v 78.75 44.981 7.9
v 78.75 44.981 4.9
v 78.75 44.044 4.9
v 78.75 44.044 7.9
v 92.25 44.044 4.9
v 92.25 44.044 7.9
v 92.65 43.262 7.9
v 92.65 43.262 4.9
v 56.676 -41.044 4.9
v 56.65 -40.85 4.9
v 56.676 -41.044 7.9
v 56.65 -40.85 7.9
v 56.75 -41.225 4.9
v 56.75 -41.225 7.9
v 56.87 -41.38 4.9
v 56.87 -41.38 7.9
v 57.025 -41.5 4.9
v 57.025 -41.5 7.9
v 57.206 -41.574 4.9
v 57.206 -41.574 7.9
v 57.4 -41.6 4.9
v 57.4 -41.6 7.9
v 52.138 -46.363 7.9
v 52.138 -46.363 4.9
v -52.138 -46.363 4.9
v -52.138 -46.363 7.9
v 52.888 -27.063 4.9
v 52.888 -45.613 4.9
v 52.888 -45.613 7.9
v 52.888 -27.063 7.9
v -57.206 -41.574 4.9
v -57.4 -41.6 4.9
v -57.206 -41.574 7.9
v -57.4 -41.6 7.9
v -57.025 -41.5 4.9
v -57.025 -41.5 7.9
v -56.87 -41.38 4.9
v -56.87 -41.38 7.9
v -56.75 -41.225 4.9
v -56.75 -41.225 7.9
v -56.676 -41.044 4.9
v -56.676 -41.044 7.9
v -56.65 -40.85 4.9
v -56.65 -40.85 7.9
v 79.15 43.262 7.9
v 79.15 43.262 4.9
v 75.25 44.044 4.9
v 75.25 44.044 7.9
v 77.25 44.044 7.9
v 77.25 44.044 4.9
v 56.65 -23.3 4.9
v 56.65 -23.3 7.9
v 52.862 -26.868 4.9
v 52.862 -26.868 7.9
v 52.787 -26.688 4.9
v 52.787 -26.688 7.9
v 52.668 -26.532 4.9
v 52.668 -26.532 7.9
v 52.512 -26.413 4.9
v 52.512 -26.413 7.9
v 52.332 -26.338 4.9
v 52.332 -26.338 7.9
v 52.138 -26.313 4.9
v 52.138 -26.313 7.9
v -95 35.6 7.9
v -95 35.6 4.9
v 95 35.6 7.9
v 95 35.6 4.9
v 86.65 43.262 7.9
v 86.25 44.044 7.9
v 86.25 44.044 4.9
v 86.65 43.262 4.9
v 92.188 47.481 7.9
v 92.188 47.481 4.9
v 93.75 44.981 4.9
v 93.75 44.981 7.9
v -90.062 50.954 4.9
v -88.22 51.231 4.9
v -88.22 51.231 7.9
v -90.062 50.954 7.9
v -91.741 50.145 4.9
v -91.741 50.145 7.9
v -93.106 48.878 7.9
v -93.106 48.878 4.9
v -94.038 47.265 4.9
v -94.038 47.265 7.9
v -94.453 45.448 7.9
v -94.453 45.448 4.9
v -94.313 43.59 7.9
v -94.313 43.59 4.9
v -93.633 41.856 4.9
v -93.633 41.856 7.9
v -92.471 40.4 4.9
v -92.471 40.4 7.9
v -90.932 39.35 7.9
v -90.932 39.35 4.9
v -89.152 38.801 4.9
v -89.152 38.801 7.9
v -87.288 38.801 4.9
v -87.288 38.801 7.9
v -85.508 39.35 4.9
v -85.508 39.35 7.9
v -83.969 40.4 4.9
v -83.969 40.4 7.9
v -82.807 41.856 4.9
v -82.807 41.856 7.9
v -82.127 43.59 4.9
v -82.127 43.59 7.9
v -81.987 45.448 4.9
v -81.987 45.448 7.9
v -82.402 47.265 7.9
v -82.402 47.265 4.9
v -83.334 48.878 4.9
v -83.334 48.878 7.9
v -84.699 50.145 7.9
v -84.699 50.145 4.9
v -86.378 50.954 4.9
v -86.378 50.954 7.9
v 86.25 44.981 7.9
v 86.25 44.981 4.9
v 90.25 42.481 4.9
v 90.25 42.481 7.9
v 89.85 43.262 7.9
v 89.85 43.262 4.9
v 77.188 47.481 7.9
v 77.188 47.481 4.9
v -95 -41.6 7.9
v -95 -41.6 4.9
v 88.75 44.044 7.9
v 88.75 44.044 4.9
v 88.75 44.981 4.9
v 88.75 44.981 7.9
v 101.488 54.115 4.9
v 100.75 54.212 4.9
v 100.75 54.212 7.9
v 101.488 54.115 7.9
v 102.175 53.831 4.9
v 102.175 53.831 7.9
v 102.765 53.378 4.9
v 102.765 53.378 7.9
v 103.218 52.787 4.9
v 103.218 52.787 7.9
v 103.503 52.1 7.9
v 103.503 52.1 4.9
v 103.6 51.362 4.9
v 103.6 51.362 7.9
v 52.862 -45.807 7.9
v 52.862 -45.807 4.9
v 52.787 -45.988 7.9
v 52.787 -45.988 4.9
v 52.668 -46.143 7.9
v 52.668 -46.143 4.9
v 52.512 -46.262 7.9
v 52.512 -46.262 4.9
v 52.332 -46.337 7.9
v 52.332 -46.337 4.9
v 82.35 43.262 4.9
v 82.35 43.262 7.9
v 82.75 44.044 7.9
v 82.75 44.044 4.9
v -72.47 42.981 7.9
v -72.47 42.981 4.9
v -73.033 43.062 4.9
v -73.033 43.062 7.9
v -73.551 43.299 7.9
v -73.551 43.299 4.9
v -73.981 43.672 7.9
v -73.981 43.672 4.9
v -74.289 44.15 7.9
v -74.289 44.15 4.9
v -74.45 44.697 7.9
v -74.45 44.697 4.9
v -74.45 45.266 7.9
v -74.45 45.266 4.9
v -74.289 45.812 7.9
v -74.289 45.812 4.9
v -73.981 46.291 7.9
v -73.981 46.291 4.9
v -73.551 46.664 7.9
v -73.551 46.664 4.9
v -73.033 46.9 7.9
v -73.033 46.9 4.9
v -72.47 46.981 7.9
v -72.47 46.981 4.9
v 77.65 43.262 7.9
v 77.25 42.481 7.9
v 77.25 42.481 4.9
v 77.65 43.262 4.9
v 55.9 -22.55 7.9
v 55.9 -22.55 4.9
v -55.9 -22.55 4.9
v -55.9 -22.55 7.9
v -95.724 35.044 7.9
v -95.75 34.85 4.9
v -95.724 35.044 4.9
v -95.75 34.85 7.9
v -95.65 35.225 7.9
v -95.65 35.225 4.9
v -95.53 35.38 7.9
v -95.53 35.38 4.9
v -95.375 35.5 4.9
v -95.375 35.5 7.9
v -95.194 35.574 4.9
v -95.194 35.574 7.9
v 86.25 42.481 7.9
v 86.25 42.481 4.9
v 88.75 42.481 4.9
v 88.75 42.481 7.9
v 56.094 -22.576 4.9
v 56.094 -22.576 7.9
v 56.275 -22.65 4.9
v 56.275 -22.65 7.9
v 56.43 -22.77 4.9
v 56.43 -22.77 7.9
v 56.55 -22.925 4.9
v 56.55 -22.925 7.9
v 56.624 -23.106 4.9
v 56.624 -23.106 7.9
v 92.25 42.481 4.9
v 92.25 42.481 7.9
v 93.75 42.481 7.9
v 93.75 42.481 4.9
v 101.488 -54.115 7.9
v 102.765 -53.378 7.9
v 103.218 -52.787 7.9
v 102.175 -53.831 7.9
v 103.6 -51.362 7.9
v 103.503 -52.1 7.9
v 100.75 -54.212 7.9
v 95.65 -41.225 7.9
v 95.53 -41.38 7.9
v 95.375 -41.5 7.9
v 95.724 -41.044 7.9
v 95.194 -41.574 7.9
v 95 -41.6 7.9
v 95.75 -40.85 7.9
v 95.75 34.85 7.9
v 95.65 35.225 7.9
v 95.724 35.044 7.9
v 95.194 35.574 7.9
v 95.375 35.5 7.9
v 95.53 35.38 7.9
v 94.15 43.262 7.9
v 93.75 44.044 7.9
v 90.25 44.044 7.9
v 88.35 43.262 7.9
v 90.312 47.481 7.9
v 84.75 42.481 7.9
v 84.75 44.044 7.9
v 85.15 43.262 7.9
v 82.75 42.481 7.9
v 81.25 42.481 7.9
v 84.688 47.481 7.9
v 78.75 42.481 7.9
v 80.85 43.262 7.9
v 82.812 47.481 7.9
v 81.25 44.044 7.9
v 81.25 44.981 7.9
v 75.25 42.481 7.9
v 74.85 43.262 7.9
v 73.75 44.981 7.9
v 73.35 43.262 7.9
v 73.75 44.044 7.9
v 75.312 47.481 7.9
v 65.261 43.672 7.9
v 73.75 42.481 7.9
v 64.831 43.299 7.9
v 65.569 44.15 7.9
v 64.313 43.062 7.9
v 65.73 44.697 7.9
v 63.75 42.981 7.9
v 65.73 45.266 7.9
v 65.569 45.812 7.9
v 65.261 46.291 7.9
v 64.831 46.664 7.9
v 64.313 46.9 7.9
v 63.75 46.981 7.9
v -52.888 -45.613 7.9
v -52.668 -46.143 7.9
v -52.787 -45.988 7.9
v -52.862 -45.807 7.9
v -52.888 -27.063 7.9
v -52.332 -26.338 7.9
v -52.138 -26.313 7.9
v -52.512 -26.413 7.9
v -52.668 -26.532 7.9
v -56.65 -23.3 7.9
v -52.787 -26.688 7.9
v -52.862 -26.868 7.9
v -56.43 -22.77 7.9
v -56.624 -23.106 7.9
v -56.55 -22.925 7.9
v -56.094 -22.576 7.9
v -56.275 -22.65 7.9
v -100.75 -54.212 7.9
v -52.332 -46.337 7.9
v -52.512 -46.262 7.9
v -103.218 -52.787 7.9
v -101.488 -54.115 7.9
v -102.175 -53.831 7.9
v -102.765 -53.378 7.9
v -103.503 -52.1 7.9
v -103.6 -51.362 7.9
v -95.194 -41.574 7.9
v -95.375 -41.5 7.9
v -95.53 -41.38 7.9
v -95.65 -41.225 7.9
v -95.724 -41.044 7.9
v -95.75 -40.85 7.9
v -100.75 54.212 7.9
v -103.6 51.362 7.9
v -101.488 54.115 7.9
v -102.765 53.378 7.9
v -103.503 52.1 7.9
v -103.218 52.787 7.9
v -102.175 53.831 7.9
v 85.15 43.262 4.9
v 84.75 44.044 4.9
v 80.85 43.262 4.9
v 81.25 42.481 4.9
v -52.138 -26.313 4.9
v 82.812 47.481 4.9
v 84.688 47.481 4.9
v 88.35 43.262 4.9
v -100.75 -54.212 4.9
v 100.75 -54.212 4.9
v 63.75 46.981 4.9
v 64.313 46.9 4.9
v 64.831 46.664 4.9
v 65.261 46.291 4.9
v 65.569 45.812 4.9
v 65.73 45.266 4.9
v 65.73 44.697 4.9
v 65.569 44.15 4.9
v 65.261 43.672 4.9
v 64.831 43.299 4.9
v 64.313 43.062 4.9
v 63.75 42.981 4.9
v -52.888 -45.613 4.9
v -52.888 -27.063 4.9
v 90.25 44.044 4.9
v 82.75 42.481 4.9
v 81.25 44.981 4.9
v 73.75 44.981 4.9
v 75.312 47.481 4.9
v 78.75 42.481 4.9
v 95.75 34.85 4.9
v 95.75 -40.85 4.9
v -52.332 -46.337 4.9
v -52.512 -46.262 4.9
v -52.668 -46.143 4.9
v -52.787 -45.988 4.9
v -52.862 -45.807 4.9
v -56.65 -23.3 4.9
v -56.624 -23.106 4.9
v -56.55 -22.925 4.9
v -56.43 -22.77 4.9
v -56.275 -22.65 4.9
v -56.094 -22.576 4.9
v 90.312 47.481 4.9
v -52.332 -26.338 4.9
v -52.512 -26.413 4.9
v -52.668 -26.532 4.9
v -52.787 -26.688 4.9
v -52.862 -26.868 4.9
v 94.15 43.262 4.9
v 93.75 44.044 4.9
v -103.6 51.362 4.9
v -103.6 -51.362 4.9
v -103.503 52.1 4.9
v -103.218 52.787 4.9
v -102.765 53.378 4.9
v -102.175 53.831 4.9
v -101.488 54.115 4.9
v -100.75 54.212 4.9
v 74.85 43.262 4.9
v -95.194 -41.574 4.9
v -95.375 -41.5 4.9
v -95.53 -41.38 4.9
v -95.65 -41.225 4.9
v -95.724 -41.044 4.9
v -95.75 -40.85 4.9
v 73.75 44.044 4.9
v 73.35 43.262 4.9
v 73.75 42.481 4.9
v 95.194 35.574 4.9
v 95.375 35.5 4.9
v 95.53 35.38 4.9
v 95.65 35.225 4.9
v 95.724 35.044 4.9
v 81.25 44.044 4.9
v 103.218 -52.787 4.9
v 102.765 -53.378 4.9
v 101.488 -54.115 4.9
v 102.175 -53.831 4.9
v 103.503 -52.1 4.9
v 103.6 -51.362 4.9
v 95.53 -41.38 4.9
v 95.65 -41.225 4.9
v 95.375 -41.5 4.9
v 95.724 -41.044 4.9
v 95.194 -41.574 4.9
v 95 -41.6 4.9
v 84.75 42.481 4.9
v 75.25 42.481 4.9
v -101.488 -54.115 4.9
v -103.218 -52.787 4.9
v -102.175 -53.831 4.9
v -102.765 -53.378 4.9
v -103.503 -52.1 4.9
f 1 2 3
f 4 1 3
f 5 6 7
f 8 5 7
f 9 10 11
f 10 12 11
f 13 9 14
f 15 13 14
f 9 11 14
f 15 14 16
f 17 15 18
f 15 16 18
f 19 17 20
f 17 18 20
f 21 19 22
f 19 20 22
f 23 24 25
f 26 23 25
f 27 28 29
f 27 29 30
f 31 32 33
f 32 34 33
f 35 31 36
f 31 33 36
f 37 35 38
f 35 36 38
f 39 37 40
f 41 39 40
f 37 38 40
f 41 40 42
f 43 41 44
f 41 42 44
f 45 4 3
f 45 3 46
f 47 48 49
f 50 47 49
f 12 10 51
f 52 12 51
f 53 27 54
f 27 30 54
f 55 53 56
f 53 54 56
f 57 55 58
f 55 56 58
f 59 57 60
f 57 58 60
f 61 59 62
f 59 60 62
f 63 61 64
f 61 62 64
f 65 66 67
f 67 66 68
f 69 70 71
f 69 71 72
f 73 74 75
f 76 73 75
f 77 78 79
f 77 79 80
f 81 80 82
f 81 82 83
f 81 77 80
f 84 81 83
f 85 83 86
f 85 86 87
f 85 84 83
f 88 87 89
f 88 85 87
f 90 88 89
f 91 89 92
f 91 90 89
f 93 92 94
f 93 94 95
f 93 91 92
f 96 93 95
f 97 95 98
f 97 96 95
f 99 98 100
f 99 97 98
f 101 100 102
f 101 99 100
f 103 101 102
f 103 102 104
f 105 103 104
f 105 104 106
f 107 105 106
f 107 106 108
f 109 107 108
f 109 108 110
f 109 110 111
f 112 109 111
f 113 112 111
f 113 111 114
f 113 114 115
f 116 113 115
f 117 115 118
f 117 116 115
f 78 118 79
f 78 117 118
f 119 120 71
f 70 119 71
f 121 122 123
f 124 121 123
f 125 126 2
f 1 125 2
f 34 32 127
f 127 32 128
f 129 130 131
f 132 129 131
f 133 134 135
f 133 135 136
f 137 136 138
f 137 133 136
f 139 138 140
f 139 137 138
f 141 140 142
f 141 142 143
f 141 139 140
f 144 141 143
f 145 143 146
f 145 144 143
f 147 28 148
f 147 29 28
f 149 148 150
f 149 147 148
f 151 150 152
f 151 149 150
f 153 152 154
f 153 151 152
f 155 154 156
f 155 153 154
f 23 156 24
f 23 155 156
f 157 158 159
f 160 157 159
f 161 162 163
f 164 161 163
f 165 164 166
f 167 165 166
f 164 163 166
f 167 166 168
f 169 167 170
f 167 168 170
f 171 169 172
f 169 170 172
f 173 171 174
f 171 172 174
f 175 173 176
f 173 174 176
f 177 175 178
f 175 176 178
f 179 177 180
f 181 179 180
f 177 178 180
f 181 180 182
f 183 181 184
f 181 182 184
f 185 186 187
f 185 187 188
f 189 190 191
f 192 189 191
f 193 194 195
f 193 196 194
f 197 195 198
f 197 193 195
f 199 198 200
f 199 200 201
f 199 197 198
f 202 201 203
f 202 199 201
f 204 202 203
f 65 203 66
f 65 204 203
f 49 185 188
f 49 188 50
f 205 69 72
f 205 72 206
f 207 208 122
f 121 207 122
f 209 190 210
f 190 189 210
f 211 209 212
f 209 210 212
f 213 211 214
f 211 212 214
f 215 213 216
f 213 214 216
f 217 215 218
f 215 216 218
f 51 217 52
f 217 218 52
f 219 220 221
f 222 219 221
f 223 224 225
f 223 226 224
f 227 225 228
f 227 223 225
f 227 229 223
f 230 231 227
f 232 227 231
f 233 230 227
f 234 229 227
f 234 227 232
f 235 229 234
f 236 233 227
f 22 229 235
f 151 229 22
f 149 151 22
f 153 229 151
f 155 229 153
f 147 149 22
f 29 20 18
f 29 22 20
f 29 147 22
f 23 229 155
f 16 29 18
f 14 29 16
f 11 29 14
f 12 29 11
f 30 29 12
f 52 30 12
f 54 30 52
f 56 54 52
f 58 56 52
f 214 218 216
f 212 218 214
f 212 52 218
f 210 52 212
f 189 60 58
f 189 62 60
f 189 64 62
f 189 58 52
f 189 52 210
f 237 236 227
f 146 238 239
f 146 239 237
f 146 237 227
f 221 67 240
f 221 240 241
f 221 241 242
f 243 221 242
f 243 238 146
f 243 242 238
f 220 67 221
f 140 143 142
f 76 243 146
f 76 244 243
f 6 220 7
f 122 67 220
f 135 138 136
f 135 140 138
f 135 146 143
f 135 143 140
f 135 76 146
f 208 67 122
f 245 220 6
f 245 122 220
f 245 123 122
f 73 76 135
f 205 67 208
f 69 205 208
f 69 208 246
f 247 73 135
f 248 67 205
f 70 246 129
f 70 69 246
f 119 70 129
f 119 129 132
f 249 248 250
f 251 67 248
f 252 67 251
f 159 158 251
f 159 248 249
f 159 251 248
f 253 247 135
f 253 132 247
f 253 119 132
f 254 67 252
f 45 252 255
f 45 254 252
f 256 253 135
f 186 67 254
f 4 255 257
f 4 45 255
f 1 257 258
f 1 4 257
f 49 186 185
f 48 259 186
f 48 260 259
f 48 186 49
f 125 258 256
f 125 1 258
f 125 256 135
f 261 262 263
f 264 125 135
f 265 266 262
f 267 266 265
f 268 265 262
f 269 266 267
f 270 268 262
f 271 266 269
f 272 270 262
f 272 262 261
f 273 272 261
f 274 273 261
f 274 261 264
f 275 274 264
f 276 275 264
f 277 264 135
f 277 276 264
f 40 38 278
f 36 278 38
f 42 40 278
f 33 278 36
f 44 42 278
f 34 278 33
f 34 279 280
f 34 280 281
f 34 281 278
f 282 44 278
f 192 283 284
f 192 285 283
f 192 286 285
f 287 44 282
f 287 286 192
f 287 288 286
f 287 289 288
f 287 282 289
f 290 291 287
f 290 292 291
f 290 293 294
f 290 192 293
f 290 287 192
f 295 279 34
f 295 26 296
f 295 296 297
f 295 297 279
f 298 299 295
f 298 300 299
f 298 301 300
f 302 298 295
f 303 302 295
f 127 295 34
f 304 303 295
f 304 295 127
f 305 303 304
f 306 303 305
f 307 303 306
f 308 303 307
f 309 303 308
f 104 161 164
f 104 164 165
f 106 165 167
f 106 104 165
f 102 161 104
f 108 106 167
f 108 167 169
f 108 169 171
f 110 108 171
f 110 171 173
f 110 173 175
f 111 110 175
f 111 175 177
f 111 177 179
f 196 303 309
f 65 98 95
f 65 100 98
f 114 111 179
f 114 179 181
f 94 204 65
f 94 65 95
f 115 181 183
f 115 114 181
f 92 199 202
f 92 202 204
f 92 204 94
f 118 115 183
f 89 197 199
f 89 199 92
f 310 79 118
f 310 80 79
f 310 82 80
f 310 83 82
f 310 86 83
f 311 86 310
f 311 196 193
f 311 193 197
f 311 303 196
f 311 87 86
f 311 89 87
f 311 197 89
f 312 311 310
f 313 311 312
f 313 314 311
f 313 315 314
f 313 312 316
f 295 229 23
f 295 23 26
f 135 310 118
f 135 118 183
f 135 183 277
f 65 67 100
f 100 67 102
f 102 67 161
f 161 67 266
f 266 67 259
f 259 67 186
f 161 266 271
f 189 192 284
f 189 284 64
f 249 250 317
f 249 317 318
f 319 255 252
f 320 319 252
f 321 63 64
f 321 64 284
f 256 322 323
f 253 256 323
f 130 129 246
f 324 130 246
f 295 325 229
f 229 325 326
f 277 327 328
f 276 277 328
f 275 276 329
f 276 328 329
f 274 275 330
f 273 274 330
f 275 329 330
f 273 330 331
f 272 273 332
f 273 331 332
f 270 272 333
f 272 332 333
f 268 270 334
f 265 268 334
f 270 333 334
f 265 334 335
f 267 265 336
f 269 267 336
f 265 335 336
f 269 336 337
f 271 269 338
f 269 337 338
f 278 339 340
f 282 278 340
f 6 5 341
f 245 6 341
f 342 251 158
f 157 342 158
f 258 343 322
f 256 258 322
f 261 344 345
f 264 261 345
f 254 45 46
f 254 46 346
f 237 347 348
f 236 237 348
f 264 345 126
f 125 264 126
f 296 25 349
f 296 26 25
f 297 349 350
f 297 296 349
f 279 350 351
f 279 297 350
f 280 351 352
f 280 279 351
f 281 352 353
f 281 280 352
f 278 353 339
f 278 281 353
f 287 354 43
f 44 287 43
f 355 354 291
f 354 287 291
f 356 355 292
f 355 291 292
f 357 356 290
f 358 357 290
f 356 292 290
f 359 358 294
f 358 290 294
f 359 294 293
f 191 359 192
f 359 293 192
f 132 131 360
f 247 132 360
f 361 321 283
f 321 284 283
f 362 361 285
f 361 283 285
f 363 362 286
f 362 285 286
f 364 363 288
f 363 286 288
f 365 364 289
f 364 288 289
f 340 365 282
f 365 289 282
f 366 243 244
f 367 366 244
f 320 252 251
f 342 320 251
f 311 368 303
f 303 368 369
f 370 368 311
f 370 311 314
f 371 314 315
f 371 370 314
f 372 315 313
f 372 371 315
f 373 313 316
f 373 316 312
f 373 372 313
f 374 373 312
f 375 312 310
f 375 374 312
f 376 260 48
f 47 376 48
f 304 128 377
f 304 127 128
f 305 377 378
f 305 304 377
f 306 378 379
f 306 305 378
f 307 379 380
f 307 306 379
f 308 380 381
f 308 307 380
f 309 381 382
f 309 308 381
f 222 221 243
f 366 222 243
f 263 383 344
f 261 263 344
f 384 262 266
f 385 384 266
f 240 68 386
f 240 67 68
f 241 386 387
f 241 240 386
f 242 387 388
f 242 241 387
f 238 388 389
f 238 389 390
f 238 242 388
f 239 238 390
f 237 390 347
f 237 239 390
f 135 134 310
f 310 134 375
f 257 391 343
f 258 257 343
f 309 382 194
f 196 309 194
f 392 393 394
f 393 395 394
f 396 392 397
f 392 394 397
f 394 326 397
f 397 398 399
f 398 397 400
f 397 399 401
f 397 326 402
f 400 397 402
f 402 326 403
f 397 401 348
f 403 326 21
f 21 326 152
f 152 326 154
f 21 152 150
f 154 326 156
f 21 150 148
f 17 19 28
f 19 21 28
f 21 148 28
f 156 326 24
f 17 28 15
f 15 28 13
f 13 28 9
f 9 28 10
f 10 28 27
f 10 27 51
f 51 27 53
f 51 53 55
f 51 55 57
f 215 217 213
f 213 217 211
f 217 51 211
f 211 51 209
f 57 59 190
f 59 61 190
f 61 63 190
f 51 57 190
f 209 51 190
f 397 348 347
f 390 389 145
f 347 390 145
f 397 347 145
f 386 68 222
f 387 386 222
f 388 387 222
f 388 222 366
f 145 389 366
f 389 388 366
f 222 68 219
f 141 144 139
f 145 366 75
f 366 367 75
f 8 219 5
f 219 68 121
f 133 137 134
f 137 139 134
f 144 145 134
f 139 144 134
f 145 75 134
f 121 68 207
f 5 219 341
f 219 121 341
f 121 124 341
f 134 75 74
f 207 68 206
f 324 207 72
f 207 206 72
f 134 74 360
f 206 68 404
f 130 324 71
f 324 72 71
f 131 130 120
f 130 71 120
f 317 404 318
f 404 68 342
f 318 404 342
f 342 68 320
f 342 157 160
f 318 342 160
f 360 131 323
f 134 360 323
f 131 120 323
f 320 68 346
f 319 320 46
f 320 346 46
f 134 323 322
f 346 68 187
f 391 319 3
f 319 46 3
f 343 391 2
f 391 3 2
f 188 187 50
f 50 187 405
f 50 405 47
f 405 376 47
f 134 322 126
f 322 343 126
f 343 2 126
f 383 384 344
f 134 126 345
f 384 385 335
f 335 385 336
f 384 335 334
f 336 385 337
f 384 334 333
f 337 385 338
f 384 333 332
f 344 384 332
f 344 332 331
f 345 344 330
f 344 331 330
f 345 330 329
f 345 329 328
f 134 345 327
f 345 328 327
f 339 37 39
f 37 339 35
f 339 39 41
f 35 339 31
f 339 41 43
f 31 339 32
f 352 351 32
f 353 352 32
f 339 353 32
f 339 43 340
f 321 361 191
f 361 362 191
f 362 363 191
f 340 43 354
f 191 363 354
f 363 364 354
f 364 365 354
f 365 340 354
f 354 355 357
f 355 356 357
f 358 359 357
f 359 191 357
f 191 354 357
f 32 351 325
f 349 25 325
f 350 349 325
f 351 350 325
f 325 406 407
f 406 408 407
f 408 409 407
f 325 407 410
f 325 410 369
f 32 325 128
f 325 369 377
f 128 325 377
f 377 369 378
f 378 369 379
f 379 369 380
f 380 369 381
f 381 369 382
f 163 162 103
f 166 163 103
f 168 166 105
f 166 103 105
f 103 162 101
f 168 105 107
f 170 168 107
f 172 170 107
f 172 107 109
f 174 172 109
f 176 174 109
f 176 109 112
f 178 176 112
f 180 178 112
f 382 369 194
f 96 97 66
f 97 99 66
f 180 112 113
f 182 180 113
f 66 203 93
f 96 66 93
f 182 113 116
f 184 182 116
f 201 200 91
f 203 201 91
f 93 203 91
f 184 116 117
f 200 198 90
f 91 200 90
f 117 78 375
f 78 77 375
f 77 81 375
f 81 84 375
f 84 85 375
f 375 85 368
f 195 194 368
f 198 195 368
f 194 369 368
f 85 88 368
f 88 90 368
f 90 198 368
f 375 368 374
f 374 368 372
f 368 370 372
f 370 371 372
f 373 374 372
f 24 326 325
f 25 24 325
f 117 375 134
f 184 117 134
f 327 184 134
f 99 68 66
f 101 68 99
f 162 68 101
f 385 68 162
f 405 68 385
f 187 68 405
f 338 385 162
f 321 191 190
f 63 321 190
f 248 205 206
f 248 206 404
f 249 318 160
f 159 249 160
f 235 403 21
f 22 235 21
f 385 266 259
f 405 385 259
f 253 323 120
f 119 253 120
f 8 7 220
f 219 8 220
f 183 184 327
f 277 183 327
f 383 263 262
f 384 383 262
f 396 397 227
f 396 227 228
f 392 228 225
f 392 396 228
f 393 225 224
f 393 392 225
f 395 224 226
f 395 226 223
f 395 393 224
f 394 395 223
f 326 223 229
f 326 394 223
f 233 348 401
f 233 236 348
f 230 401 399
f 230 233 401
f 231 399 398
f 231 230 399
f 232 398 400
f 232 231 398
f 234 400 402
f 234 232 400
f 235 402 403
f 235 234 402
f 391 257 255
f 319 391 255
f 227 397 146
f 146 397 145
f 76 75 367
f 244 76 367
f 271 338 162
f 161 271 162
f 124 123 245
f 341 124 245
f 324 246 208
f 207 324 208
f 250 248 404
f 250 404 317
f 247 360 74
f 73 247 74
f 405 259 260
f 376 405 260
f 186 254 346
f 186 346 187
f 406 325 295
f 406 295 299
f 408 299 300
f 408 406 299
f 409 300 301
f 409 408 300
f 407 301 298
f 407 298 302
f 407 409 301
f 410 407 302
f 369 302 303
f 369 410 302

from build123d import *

# Parameters (mm, degrees)
SHAPEBINDER_W   = 20.05
SHAPEBINDER_H   = 105.775
SHAPEBINDER_R   = 6.25
PAD001_DEPTH    = 3
POCKET006_DEPTH = 3
FILLET001_R     = 0.75
SKETCH035_W     = 20
SKETCH035_H     = 1.5625
PAD015_DEPTH    = 3
POCKET025_DEPTH = 5


with BuildPart() as part:
    # ShapeBinder → Pad001 (new body)
    with BuildSketch(Plane(origin=(1.263411, 2.723963, 4.9), x_dir=(0, 1, 0), z_dir=(0, 0, 1))):
        with BuildLine():
            ThreePointArc((51.638537, 102.013411), (50.759858, 104.134731), (48.638537, 105.013411))
            Line((48.638537, 105.013411), (-54.086463, 105.013411))
            ThreePointArc((-54.086463, 105.013411), (-56.207783, 104.134731), (-57.086463, 102.013411))
            Line((-57.086463, 102.013411), (-57.086463, -99.486589))
            ThreePointArc((-57.086463, -99.486589), (-56.207783, -101.607909), (-54.086463, -102.486589))
            Line((-54.086463, -102.486589), (48.638537, -102.486589))
            ThreePointArc((48.638537, -102.486589), (50.759858, -101.607909), (51.638537, -99.486589))
            Line((51.638537, -99.486589), (51.638537, 102.013411))
        make_face()
        with Locations((-39.061463, 1.263411)):
            Rectangle(SHAPEBINDER_W, SHAPEBINDER_H, mode=Mode.SUBTRACT)
        Polygon((-44.323963, 97.013411), (32.876037, 97.013411), (32.876037, -94.486589), (-44.323963, -94.486589), (-44.323963, -55.386589), (-25.273963, -55.386589), (-25.273963, 57.913411), (-44.323963, 57.913411), align=None, mode=Mode.SUBTRACT)
        with Locations((42.257287, 89.483411)):
            Circle(SHAPEBINDER_R, mode=Mode.SUBTRACT)
        with BuildLine():
            ThreePointArc((40.257287, 73.733411), (42.257287, 75.733411), (44.257287, 73.733411))
            Line((44.257287, 73.733411), (44.257287, -62.486589))
            ThreePointArc((44.257287, -62.486589), (42.257287, -64.486589), (40.257287, -62.486589))
            Line((40.257287, -62.486589), (40.257287, 73.733411))
        make_face(mode=Mode.SUBTRACT)
        Polygon((42.257287, -72.486589), (44.757287, -74.049089), (44.757287, -75.924089), (42.257287, -77.486589), (41.319787, -77.486589), (41.319787, -76.861589), (40.538537, -77.486589), (39.757287, -76.861589), (39.757287, -75.611589), (40.538537, -76.236589), (41.319787, -75.611589), (41.319787, -74.361589), (40.538537, -73.736589), (39.757287, -74.361589), (39.757287, -73.111589), (40.538537, -72.486589), (41.319787, -73.111589), (41.319787, -72.486589), align=None, mode=Mode.SUBTRACT)
        Polygon((42.257287, -79.986589), (44.757287, -81.549089), (44.757287, -83.424089), (42.257287, -84.986589), (41.319787, -84.986589), (41.319787, -84.361589), (40.538537, -84.986589), (39.757287, -84.361589), (39.757287, -83.111589), (40.538537, -83.736589), (41.319787, -83.111589), (41.319787, -81.861589), (40.538537, -81.236589), (39.757287, -81.861589), (39.757287, -80.611589), (40.538537, -79.986589), (41.319787, -80.611589), (41.319787, -79.986589), align=None, mode=Mode.SUBTRACT)
        Polygon((42.257287, -87.486589), (44.757287, -89.049089), (44.757287, -90.924089), (42.257287, -92.486589), (41.319787, -92.486589), (41.319787, -91.861589), (40.538537, -92.486589), (39.757287, -91.861589), (39.757287, -90.611589), (40.538537, -91.236589), (41.319787, -90.611589), (41.319787, -89.361589), (40.538537, -88.736589), (39.757287, -89.361589), (39.757287, -88.111589), (40.538537, -87.486589), (41.319787, -88.111589), (41.319787, -87.486589), align=None, mode=Mode.SUBTRACT)
    extrude(amount=PAD001_DEPTH)

    # Sketch007 (on Face80 of Pad001) → Pocket006 (cut)
    with BuildSketch(Plane(origin=(0, 0, 4.9), x_dir=(1, 0, 0), z_dir=(0, 0, -1))):
        with BuildLine():
            ThreePointArc((-100.75, 56.3625), (-104.285534, 54.898034), (-105.75, 51.3625))
            Line((-105.75, -51.3625), (-105.75, 51.3625))
            ThreePointArc((-105.75, -51.3625), (-104.285534, -54.898034), (-100.75, -56.3625))
            Line((100.75, -56.3625), (-100.75, -56.3625))
            ThreePointArc((100.75, -56.3625), (104.285534, -54.898034), (105.75, -51.3625))
            Line((105.75, 51.3625), (105.75, -51.3625))
            ThreePointArc((105.75, 51.3625), (104.285534, 54.898034), (100.75, 56.3625))
            Line((-100.75, 56.3625), (100.75, 56.3625))
        make_face()
        with BuildLine():
            ThreePointArc((-100.75, 54.2125), (-102.765254, 53.377754), (-103.6, 51.3625))
            Line((-103.6, -51.3625), (-103.6, 51.3625))
            ThreePointArc((-103.6, -51.3625), (-102.765254, -53.377754), (-100.75, -54.2125))
            Line((100.75, -54.2125), (-100.75, -54.2125))
            ThreePointArc((100.75, -54.2125), (102.765254, -53.377754), (103.6, -51.3625))
            Line((103.6, 51.3625), (103.6, -51.3625))
            ThreePointArc((103.6, 51.3625), (102.765254, 53.377754), (100.75, 54.2125))
            Line((-100.75, 54.2125), (100.75, 54.2125))
        make_face(mode=Mode.SUBTRACT)
    extrude(amount=-POCKET006_DEPTH, mode=Mode.SUBTRACT)

    # Fillet001
    fillet001_edges = [part.edges().sort_by_distance(p)[0] for p in [
        (-95.75, 35.6, 6.4),
        (-95.75, -41.6, 6.4),
        (-56.65, -22.55, 6.4),
        (-56.65, -41.6, 6.4),
        (-52.8875, -46.3625, 6.4),
        (52.8875, -46.3625, 6.4),
        (52.8875, -26.3125, 6.4),
        (95.75, 35.6, 6.4),
        (-52.8875, -26.3125, 6.4),
        (95.75, -41.6, 6.4),
        (56.65, -22.55, 6.4),
        (56.65, -41.6, 6.4),
    ]]
    fillet(fillet001_edges, radius=FILLET001_R)

    # Sketch035 (on Face93 of Fillet001) → Pad015 (join)
    with BuildSketch(Plane.XY.offset(7.9)):
        with Locations((83.75, 43.2625)):
            Rectangle(SKETCH035_W, SKETCH035_H)
    extrude(amount=-PAD015_DEPTH)

    # Sketch036 (on Face69 of Pad015) → Pocket025 (cut)
    with BuildSketch(Plane.XY.offset(7.9)):
        Polygon((73.75, 44.04375), (73.35, 43.2625), (73.75, 42.48125), (75.25, 42.48125), (74.85, 43.2625), (75.25, 44.04375), align=None)
        Polygon((78.75, 44.04375), (79.15, 43.2625), (78.75, 42.48125), (77.25, 42.48125), (77.65, 43.2625), (77.25, 44.04375), align=None)
        Polygon((81.25, 44.04375), (80.85, 43.2625), (81.25, 42.48125), (82.75, 42.48125), (82.35, 43.2625), (82.75, 44.04375), align=None)
        Polygon((86.25, 44.04375), (86.65, 43.2625), (86.25, 42.48125), (84.75, 42.48125), (85.15, 43.2625), (84.75, 44.04375), align=None)
        Polygon((88.75, 44.04375), (88.35, 43.2625), (88.75, 42.48125), (90.25, 42.48125), (89.85, 43.2625), (90.25, 44.04375), align=None)
        Polygon((93.75, 44.04375), (92.25, 44.04375), (92.65, 43.2625), (92.25, 42.48125), (93.75, 42.48125), (94.15, 43.2625), align=None)
    extrude(amount=-POCKET025_DEPTH, mode=Mode.SUBTRACT)


solid = part.part
